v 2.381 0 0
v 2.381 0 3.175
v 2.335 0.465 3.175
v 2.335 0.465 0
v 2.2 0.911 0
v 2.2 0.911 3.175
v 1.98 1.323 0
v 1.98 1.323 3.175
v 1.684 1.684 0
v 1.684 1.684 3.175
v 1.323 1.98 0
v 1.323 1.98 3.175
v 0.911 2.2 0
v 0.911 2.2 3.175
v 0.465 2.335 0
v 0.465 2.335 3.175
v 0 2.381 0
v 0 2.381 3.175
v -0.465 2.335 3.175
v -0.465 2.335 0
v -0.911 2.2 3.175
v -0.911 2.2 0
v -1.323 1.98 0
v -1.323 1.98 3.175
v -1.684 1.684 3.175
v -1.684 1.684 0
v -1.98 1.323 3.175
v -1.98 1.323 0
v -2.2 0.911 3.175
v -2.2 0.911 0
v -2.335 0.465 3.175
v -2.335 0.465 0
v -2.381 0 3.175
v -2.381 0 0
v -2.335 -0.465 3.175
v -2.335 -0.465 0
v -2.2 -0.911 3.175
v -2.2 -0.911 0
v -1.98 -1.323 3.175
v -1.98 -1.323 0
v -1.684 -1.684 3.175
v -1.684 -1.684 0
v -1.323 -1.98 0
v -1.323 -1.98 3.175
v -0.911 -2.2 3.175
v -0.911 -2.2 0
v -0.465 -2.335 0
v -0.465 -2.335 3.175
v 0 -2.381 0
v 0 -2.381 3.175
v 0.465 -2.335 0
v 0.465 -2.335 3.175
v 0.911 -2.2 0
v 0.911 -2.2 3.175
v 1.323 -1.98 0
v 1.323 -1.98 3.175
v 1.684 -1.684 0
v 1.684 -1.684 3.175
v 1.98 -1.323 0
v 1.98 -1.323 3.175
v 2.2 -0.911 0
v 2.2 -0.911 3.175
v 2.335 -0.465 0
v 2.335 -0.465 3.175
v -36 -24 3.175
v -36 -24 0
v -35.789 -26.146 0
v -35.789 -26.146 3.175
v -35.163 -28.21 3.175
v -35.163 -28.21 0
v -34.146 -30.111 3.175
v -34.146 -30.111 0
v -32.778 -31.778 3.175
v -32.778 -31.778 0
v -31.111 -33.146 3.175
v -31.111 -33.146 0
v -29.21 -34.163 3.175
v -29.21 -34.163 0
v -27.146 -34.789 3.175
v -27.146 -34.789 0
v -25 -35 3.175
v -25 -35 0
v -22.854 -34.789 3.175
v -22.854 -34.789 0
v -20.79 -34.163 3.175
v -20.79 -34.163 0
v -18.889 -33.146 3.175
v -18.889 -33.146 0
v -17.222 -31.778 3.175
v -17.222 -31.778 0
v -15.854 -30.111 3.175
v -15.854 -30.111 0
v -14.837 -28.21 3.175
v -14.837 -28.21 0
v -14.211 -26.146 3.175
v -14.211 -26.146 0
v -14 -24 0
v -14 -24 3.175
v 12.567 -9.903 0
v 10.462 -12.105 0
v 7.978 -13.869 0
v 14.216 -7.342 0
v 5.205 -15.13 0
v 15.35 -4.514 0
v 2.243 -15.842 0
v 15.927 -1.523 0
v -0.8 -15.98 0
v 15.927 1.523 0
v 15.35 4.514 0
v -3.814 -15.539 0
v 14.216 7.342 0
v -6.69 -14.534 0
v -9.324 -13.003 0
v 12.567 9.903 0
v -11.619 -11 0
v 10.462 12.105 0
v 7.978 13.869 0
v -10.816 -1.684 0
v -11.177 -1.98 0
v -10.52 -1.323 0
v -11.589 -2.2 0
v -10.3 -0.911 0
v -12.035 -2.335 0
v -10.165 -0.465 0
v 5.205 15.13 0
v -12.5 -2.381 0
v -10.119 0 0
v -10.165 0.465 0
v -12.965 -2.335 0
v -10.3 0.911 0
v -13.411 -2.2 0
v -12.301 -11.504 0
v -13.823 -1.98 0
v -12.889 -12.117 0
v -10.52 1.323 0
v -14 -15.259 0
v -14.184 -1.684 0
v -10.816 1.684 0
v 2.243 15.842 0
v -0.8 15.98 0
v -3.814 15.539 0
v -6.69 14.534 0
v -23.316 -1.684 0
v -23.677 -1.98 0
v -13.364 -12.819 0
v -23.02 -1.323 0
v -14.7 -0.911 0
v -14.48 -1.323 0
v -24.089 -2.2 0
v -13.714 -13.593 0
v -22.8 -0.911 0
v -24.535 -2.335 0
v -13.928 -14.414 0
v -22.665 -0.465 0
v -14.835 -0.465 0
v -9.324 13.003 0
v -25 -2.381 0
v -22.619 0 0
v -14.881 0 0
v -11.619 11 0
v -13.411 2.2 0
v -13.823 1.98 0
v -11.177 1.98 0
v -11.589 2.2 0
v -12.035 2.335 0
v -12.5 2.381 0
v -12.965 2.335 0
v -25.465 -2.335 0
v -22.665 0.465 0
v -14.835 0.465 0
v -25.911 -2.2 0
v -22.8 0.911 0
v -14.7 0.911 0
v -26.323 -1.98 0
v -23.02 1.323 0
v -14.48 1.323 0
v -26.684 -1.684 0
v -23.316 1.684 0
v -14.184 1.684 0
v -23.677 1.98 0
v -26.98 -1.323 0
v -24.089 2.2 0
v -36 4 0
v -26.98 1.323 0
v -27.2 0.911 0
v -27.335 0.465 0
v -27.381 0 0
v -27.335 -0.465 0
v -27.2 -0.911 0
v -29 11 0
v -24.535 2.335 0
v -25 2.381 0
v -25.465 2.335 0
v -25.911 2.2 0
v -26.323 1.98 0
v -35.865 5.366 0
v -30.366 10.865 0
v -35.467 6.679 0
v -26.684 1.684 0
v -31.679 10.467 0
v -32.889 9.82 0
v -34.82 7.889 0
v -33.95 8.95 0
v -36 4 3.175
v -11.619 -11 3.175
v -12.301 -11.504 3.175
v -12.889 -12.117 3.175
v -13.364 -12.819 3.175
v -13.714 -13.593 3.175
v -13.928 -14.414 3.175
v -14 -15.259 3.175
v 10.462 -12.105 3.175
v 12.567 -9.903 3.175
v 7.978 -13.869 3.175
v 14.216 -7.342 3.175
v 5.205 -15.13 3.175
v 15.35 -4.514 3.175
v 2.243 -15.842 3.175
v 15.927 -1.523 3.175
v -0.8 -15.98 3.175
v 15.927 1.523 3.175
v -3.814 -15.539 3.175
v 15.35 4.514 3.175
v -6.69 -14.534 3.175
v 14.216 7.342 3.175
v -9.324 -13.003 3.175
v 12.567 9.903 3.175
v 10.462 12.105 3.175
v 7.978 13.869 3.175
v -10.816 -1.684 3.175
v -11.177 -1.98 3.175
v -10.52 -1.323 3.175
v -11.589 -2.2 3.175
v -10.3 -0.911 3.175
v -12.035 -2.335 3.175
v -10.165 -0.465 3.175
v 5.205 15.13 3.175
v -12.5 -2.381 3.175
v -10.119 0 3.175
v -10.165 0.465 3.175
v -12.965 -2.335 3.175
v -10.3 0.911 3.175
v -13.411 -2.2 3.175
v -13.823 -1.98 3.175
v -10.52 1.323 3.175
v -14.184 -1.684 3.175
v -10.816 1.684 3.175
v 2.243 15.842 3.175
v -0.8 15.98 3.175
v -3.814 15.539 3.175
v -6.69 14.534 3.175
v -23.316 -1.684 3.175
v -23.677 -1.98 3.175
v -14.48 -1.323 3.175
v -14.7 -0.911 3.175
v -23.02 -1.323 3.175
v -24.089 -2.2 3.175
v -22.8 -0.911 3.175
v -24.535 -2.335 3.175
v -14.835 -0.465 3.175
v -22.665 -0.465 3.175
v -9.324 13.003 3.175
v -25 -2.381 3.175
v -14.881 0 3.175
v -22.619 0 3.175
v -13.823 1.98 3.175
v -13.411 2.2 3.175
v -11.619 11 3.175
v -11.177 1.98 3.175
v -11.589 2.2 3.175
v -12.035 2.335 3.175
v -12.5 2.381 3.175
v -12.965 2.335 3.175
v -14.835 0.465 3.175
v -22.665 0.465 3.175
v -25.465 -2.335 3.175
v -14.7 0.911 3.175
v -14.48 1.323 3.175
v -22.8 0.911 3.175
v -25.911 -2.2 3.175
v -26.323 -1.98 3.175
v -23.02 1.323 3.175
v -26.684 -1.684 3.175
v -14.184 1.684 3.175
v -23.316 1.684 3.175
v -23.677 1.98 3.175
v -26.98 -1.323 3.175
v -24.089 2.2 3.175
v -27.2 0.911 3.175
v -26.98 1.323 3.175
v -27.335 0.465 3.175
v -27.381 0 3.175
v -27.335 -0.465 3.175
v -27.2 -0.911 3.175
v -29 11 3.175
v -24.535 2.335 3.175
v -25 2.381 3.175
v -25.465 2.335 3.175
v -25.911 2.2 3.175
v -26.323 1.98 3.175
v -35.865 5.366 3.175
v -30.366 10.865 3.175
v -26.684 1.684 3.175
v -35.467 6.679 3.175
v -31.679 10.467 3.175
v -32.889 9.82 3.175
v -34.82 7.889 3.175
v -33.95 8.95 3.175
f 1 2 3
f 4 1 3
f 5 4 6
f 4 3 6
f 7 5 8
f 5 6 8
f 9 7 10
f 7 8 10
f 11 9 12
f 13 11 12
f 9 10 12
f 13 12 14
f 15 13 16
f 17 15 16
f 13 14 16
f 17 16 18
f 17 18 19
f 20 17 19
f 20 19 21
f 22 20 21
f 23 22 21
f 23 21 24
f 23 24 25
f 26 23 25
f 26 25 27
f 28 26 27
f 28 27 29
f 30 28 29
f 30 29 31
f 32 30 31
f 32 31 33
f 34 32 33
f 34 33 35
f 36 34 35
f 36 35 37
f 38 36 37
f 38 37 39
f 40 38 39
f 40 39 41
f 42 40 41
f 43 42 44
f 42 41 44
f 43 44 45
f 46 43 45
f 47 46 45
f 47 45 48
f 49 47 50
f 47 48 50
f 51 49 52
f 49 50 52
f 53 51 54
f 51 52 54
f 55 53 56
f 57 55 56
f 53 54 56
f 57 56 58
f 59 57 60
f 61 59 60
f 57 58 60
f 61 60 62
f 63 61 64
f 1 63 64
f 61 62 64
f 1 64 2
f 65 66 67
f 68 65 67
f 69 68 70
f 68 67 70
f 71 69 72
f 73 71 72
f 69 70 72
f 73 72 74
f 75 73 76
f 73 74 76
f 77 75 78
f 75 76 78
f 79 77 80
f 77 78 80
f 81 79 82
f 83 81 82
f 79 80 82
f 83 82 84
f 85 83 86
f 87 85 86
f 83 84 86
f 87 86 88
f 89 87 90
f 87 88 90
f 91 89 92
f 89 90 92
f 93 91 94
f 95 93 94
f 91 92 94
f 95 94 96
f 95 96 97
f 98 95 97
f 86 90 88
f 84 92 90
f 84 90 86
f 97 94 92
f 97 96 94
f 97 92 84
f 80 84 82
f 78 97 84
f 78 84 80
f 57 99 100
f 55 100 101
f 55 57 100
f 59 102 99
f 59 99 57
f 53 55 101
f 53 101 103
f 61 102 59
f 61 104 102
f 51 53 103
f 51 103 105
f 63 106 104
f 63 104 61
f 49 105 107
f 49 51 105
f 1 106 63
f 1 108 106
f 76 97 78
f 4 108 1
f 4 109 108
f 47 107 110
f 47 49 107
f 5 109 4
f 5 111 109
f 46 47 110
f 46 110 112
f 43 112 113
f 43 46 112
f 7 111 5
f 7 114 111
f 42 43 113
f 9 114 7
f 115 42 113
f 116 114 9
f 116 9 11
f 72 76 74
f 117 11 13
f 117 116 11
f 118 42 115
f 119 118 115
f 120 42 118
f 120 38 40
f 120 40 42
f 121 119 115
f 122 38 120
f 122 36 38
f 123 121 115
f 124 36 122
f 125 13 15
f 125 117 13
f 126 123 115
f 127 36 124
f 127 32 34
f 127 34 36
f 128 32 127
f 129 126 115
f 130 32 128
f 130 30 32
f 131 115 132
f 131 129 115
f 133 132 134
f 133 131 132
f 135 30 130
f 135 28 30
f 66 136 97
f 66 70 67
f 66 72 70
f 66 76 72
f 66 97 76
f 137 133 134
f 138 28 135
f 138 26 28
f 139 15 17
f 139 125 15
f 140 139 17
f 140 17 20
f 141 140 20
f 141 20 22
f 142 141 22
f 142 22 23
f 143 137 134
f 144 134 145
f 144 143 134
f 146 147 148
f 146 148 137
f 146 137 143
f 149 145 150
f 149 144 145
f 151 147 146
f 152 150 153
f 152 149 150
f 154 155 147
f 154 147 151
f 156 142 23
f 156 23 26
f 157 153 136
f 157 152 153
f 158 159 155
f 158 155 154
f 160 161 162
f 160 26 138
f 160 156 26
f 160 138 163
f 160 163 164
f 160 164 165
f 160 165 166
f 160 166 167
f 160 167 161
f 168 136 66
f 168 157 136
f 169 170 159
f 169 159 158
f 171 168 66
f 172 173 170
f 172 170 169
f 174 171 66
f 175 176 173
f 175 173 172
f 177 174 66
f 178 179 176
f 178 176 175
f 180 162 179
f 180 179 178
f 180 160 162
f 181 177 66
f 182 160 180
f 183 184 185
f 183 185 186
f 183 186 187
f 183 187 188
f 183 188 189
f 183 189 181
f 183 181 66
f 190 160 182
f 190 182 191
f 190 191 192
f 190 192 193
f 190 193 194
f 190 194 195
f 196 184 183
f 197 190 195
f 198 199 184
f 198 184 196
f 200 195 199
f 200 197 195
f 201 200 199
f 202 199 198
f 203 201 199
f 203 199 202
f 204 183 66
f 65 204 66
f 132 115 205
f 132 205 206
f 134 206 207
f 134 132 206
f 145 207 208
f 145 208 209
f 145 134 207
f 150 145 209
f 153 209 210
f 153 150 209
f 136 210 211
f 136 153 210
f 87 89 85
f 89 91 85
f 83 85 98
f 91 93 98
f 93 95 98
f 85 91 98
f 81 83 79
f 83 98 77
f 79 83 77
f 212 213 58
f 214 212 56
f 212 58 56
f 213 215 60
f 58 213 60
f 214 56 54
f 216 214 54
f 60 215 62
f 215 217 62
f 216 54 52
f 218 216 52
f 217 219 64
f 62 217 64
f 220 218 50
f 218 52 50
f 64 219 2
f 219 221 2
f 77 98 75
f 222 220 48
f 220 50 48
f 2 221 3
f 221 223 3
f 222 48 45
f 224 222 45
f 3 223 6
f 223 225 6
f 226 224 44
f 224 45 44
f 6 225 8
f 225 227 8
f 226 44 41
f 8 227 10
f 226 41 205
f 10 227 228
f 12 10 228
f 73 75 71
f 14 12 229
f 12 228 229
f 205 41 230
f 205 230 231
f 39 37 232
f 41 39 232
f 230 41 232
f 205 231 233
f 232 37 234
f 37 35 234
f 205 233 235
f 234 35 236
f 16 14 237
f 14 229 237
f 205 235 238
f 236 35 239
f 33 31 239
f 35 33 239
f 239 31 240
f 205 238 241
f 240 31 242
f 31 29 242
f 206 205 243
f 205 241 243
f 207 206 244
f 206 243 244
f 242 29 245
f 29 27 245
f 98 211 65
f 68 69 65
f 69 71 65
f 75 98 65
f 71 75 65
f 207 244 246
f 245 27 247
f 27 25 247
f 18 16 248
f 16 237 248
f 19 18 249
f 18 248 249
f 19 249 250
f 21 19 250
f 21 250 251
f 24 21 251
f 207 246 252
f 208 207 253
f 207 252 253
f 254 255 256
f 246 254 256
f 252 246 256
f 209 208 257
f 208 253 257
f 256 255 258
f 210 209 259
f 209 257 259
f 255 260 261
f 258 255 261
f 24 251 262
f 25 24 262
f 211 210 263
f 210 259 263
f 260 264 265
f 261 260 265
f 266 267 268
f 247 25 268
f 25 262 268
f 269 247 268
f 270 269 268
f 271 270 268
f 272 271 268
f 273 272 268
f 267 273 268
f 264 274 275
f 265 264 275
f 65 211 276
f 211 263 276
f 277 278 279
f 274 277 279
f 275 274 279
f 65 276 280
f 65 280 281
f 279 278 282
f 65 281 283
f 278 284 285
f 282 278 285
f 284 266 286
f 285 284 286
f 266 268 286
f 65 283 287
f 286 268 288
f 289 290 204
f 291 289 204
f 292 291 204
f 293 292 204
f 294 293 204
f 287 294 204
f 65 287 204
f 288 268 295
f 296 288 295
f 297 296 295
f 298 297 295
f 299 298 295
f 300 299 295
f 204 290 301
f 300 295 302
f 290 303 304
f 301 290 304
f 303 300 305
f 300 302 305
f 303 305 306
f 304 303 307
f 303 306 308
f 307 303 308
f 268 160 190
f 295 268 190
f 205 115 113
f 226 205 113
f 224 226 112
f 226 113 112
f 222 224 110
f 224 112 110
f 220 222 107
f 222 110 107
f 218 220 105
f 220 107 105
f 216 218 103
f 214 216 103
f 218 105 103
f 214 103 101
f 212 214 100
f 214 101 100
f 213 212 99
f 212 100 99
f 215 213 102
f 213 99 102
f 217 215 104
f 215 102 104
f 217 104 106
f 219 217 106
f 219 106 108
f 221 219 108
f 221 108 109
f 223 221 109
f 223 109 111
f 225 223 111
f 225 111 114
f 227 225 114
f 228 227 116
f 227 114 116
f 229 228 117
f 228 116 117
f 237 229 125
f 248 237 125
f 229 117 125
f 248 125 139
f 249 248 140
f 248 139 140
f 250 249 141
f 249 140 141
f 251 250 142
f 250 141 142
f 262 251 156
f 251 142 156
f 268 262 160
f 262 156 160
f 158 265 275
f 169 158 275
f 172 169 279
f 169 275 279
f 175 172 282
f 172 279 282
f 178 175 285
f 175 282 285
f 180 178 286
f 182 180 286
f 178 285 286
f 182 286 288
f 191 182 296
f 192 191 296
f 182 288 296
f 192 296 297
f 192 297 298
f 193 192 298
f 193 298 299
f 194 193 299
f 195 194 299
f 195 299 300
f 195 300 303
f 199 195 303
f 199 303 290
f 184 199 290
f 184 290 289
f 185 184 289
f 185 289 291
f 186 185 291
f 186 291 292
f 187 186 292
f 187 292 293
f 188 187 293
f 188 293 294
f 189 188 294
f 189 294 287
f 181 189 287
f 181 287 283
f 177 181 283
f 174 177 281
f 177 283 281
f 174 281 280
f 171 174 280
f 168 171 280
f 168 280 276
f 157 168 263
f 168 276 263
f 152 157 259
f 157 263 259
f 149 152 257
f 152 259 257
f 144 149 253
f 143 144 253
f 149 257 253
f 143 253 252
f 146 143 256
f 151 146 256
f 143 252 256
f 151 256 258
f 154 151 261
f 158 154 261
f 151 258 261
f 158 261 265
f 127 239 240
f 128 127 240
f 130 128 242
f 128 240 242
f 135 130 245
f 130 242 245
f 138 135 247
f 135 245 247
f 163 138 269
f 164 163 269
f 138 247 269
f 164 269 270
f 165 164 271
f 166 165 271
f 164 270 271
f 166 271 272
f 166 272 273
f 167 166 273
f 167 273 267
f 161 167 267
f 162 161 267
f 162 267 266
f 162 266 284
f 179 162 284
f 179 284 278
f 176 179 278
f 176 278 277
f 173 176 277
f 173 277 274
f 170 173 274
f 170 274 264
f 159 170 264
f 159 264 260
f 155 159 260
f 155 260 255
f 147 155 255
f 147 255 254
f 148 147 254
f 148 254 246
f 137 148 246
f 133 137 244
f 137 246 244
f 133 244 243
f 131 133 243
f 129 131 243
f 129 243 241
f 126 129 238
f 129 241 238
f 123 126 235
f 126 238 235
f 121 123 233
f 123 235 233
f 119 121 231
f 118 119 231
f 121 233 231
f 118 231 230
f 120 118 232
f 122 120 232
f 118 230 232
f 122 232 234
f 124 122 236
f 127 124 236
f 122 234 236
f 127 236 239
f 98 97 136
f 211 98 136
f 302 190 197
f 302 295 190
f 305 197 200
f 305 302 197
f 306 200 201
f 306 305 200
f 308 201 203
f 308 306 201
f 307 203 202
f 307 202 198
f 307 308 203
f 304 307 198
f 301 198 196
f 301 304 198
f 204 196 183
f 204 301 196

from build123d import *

# Parameters (mm, degrees)
BOSS_EXTRUDE1_DEPTH = 3.175
FILLET1_R           = 7
FILLET2_R           = 5
SKETCH2_R           = 2.38125
CUT_EXTRUDE1_DEPTH  = 51.309846203
LPATTERN1_COUNT     = 3
LPATTERN1_PITCH     = 12.5


with BuildPart() as part:
    # Sketch1 → Boss-Extrude1 (new body)
    with BuildSketch(Plane.XY):
        with BuildLine():
            Line((-11.618950039, 11), (-36, 11))
            Line((-36, 11), (-36, -24))
            ThreePointArc((-36, -24), (-25, -35), (-14, -24))
            Line((-14, -24), (-14, -11))
            Line((-14, -11), (-11.618950039, -11))
            ThreePointArc((-11.618950039, -11), (16, 0), (-11.618950039, 11))
        make_face()
    extrude(amount=BOSS_EXTRUDE1_DEPTH)

    # Fillet1
    fillet1_edges = [part.edges().sort_by_distance(p)[0] for p in [
        (-36, 11, 1.5875),
    ]]
    fillet(fillet1_edges, radius=FILLET1_R)

    # Fillet2
    # the kernel refuses this fillet: 5 mm, written as the material it adds along each edge
    with BuildSketch(Plane(origin=(-14, -11, 0), x_dir=(1, 0, 0), z_dir=(0, 0, 1))) as fillet2_piece_1:
        with BuildLine():
            CenterArc((5, -4.259237102), FILLET2_R, 121.586822832, 58.413177168)
            Line((0, -4.259237102), (-0.1, -4.259237102))
            Line((-0.1, -4.259237102), (-0.1, 0))
            Line((-0.1, 0), (0, 0.1))
            ThreePointArc((0, 0.1), (1.190524981, 0.1), (2.328670961, 0.085184742))
            Line((2.328670961, 0.085184742), (2.381049961, 0))
        make_face()
    extrude(amount=3.175)

    # Sketch2 → Cut-Extrude1 (cut, through all)
    with BuildSketch(Plane.XY.offset(3.175)):
        Circle(SKETCH2_R)
    cut_extrude1 = extrude(amount=-CUT_EXTRUDE1_DEPTH, mode=Mode.SUBTRACT)

    # LPattern1: Cut-Extrude1 ×3
    with Locations(*[(-i * LPATTERN1_PITCH, 0, 0) for i in range(1, LPATTERN1_COUNT)]):
        add(cut_extrude1, mode=Mode.SUBTRACT)


solid = part.part
